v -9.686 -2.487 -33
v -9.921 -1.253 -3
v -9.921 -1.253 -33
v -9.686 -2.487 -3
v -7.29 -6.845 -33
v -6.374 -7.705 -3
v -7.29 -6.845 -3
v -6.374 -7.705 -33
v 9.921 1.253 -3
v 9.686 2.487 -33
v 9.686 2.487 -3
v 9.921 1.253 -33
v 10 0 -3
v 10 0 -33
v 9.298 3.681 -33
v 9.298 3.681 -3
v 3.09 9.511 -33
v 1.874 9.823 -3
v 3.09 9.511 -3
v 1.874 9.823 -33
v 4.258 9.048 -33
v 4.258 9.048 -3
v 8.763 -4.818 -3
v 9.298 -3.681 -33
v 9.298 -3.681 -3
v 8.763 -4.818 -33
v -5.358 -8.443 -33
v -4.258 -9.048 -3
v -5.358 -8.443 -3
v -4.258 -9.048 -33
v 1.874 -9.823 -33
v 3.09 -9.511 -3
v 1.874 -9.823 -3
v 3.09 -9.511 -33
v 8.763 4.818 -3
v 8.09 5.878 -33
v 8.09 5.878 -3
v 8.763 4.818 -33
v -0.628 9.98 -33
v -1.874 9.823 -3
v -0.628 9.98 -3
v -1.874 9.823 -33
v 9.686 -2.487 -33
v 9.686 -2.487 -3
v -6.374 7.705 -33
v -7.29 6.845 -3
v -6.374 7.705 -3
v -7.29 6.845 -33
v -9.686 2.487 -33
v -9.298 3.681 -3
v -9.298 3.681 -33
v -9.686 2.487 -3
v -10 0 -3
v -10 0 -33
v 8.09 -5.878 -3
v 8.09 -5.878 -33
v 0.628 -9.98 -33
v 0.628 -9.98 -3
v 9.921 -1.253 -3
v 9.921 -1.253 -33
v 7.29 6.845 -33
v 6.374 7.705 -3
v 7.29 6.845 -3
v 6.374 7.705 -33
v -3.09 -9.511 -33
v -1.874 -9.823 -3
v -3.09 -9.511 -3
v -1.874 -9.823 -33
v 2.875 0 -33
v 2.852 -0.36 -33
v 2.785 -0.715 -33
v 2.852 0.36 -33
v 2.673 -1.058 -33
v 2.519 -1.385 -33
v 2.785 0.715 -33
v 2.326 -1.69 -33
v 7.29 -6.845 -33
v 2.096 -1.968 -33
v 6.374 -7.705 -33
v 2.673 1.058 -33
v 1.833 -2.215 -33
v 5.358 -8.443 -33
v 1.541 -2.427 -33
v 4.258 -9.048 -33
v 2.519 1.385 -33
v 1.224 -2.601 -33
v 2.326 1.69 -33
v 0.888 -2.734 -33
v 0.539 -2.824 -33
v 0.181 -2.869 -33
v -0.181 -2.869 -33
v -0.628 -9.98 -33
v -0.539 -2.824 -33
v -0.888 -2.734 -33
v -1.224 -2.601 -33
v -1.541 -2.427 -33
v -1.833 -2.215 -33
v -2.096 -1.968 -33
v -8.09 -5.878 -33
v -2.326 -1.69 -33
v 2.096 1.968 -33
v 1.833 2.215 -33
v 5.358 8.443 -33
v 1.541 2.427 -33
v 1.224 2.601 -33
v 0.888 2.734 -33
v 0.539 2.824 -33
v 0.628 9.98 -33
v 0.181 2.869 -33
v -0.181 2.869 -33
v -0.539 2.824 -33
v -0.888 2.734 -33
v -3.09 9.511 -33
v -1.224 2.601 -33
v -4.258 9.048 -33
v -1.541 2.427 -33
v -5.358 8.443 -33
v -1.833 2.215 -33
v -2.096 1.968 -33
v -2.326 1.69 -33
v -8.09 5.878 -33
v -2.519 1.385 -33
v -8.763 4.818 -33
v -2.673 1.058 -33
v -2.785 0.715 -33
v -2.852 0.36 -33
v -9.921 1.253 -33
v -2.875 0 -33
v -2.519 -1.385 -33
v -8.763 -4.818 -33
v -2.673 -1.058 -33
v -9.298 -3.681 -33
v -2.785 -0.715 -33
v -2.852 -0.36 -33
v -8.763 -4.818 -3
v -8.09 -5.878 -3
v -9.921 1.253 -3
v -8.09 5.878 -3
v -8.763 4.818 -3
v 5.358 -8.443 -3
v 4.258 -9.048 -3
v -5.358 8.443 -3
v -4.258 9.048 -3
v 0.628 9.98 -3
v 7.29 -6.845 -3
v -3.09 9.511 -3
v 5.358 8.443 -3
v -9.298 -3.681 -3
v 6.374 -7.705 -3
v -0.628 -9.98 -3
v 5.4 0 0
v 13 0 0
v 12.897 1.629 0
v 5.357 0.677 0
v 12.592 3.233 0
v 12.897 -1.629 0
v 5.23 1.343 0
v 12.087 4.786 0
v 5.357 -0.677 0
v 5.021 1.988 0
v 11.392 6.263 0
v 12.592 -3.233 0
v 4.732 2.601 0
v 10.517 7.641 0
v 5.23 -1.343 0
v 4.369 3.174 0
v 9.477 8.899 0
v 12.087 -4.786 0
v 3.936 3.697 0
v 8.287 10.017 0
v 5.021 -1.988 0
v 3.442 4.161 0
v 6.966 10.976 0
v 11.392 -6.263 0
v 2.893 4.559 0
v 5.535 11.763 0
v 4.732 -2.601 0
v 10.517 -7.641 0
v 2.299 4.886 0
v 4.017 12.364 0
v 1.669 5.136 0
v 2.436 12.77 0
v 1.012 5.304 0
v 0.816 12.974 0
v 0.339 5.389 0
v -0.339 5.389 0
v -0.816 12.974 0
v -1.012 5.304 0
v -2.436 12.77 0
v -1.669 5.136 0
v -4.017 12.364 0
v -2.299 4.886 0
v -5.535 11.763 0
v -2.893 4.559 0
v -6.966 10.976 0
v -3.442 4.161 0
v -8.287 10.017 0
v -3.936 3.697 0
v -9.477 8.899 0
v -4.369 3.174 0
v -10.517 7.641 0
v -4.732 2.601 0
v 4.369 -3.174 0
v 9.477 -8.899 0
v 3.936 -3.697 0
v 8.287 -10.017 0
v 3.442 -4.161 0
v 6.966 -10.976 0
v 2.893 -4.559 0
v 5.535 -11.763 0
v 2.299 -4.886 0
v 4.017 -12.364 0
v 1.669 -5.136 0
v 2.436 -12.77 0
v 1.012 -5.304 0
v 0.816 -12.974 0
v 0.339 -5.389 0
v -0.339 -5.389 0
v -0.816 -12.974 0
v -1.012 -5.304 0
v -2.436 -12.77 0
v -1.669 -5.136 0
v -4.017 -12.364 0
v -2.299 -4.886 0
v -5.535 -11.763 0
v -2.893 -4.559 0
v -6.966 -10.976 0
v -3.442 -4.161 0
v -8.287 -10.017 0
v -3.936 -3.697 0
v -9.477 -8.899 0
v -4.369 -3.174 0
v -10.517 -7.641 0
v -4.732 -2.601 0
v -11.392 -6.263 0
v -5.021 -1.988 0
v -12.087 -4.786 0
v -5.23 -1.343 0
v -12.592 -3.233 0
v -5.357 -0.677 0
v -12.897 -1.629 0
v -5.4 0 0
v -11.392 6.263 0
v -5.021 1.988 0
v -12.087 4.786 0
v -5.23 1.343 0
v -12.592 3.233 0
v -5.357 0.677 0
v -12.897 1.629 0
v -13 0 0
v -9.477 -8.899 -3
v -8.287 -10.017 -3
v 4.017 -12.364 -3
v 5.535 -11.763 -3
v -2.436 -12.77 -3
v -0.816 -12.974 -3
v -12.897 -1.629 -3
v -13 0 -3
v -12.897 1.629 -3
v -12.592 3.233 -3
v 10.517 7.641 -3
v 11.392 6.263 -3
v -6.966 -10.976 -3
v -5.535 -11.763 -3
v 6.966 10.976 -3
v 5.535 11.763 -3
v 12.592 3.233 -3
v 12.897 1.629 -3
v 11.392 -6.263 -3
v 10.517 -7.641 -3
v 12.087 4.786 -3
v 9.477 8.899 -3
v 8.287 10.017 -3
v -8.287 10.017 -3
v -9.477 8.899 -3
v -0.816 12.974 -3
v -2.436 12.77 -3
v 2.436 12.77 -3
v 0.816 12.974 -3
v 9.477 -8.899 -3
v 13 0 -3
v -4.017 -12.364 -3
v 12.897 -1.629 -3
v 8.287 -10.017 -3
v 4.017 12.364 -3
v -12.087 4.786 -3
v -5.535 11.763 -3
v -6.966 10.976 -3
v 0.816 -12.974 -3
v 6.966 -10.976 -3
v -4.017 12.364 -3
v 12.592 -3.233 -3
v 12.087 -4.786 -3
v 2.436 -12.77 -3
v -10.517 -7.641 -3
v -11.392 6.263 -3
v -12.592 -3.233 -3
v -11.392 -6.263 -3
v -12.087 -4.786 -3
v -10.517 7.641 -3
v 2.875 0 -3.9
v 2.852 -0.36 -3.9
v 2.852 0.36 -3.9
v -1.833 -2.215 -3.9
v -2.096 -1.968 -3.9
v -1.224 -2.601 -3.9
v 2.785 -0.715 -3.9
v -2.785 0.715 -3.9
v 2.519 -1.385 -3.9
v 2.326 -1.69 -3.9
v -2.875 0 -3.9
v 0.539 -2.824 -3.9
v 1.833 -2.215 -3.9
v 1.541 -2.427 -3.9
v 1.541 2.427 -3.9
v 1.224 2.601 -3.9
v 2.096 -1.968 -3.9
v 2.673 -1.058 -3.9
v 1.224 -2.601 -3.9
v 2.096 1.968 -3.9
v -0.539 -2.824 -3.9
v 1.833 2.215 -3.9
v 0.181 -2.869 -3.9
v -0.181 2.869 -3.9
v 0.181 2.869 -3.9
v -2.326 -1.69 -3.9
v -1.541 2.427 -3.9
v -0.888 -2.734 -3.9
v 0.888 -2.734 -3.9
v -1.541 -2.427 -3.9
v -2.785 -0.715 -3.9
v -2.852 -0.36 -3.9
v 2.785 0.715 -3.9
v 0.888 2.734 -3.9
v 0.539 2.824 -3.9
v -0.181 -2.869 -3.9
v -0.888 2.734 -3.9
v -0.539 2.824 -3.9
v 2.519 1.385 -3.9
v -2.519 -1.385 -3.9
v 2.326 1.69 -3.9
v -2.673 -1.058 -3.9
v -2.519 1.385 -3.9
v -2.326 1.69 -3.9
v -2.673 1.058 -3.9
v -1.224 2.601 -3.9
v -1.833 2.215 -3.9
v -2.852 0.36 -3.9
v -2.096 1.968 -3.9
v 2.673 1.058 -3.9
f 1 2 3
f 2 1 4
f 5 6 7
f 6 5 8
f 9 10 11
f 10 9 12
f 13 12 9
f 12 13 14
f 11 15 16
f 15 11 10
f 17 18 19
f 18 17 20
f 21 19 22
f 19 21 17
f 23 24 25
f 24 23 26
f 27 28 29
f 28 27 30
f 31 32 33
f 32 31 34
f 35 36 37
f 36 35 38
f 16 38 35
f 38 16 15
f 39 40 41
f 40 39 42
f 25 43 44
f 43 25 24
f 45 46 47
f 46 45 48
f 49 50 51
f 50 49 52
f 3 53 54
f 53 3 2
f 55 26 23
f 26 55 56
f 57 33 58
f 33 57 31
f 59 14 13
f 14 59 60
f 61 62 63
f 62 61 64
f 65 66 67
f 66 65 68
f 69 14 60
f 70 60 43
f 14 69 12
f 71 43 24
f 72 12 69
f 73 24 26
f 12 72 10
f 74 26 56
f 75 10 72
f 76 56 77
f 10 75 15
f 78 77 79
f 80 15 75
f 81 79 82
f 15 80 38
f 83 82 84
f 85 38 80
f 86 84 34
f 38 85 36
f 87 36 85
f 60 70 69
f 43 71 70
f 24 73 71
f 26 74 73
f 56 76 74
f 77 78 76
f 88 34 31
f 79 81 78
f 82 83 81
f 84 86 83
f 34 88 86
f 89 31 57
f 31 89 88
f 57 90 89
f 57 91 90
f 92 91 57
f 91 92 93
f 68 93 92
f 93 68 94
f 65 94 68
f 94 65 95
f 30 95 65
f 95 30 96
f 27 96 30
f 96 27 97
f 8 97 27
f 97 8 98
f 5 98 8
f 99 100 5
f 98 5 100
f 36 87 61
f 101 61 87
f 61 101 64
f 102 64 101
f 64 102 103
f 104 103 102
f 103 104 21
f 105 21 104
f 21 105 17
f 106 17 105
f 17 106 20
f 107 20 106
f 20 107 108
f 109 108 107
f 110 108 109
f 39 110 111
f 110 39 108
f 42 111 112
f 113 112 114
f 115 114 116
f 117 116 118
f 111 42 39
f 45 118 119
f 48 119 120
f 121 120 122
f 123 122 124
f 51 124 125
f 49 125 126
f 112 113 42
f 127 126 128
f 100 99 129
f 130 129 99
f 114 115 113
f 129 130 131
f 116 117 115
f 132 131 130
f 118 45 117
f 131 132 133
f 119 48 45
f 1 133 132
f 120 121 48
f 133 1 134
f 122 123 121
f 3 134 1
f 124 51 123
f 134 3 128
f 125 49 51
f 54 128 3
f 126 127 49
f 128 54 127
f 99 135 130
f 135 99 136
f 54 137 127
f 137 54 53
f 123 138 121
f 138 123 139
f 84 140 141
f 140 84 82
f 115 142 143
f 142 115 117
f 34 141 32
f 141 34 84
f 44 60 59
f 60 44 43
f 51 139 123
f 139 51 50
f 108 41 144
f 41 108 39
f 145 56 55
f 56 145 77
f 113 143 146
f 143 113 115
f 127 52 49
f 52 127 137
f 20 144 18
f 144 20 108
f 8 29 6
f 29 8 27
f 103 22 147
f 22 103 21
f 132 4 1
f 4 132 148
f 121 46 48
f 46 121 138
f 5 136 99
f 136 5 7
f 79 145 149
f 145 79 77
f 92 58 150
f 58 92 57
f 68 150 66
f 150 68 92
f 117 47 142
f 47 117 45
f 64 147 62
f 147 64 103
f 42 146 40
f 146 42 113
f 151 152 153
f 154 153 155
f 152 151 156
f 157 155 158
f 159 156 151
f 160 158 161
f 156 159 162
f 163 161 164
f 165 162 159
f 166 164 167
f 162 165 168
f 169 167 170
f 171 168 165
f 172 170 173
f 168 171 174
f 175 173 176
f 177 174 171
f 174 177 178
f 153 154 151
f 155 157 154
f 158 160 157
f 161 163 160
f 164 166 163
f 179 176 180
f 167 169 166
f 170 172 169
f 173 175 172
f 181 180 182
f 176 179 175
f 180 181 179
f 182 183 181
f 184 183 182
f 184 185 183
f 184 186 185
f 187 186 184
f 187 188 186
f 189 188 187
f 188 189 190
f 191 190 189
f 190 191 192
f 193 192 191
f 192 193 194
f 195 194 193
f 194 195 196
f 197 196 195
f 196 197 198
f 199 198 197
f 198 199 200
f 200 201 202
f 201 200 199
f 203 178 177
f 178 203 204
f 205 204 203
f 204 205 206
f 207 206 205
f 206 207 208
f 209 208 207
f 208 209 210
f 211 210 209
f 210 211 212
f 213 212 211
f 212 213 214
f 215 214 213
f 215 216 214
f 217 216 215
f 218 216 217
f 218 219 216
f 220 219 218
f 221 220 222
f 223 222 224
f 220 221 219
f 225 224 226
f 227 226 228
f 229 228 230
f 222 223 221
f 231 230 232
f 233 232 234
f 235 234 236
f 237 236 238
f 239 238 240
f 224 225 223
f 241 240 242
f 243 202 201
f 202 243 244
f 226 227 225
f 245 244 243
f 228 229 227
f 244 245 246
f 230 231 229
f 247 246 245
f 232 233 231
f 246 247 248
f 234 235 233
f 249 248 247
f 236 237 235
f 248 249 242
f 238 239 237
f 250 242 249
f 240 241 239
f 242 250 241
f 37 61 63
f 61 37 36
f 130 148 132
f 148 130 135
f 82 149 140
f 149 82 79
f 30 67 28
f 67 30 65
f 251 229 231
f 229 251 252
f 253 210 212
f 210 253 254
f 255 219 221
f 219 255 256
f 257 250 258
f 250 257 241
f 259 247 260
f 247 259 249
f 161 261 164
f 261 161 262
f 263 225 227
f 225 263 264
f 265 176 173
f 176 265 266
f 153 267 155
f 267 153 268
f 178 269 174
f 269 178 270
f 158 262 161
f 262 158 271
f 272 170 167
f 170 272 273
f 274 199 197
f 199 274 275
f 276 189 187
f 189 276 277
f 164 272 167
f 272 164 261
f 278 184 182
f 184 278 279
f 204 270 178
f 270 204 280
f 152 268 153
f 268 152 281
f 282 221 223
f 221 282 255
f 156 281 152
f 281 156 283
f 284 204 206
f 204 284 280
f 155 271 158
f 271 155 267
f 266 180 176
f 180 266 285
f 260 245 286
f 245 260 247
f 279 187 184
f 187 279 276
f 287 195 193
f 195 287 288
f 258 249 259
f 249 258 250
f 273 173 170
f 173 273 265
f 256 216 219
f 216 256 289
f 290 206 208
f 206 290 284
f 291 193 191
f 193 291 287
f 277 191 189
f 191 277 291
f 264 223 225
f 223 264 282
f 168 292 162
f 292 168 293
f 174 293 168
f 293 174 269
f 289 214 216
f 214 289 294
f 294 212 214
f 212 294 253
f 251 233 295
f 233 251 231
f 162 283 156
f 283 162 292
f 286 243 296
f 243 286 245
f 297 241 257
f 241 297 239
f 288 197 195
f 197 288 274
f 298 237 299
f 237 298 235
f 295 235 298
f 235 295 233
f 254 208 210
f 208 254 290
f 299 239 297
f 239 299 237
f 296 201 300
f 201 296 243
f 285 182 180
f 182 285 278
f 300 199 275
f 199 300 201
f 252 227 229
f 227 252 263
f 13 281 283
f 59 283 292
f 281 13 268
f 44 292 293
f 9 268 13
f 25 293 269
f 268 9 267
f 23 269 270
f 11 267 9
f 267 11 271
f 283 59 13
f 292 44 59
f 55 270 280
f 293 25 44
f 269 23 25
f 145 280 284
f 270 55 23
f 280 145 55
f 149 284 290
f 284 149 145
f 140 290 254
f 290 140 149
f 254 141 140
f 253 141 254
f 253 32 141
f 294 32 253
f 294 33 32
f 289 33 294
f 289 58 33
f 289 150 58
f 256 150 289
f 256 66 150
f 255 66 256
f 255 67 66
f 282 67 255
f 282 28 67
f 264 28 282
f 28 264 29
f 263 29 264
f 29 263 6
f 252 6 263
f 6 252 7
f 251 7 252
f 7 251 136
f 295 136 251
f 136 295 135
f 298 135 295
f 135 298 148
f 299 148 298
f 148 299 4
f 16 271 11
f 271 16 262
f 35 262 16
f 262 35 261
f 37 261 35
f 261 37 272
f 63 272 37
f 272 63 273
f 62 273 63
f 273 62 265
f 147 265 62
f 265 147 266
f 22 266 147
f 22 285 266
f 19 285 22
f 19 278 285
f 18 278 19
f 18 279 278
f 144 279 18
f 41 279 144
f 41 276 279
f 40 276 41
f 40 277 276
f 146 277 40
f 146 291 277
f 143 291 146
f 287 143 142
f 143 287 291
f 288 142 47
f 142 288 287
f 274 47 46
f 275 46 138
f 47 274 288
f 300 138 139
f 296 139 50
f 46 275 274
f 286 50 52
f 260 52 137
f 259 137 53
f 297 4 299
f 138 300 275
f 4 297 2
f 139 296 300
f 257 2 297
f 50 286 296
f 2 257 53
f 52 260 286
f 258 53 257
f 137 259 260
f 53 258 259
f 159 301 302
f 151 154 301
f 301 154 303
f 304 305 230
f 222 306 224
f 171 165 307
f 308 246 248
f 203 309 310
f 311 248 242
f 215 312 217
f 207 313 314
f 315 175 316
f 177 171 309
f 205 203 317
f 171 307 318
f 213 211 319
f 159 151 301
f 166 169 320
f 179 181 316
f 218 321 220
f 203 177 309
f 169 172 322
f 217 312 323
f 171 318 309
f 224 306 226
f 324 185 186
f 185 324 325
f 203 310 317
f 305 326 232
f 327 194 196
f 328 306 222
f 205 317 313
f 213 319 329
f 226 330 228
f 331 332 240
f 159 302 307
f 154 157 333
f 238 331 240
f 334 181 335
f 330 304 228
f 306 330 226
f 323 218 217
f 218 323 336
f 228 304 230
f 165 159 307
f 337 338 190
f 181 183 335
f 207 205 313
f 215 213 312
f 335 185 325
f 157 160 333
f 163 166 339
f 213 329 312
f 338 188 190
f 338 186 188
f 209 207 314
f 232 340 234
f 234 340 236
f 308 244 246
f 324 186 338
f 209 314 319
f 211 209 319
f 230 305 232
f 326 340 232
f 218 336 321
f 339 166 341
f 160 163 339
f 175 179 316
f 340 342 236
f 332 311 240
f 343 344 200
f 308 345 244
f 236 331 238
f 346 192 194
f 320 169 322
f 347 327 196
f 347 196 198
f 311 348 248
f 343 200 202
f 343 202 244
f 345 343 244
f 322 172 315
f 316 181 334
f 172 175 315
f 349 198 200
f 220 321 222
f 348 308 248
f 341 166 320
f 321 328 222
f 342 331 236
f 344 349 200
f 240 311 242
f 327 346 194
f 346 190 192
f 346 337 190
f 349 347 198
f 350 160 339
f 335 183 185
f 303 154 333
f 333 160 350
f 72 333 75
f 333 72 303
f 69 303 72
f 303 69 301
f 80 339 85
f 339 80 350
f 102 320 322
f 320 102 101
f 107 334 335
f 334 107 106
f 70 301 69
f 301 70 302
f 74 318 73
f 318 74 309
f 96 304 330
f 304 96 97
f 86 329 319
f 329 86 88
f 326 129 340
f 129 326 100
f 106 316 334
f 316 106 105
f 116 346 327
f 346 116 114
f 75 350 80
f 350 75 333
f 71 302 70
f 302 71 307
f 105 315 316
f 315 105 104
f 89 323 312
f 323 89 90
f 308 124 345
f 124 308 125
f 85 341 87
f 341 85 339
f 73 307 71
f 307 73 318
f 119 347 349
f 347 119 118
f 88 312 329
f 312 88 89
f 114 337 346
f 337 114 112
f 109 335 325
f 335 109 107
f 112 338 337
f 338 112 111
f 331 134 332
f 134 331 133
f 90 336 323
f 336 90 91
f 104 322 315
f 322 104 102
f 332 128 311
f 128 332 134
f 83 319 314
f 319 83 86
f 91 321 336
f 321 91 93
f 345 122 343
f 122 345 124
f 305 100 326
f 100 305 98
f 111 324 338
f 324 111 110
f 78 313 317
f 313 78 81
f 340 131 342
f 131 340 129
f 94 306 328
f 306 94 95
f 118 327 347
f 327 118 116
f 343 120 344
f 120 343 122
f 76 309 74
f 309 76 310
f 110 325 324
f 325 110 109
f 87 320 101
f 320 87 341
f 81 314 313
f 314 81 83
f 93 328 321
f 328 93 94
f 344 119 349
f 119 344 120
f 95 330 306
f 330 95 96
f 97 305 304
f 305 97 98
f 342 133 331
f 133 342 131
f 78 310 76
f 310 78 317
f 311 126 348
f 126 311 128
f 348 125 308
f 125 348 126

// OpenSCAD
$fn = 50;


difference() {
	union() {
		translate(v = [0, 0, -33.0000000000]) {
			cylinder(h = 33, r = 10.0000000000);
		}
		translate(v = [0, 0, -3.0000000000]) {
			cylinder(h = 3, r = 13.0000000000);
		}
	}
	union() {
		translate(v = [0, 0, 0]) {
			rotate(a = [0, 0, 0]) {
				difference() {
					union() {
						#translate(v = [0, 0, -33.0000000000]) {
							cylinder(h = 33, r = 2.6000000000);
						}
						#translate(v = [0, 0, -3.9000000000]) {
							cylinder(h = 3.9000000000, r1 = 2.8750000000, r2 = 5.4000000000);
						}
						#translate(v = [0, 0, -33.0000000000]) {
							cylinder(h = 33, r = 2.8750000000);
						}
						#translate(v = [0, 0, -33.0000000000]) {
							cylinder(h = 33, r = 2.6000000000);
						}
					}
					union();
				}
			}
		}
	}
}
